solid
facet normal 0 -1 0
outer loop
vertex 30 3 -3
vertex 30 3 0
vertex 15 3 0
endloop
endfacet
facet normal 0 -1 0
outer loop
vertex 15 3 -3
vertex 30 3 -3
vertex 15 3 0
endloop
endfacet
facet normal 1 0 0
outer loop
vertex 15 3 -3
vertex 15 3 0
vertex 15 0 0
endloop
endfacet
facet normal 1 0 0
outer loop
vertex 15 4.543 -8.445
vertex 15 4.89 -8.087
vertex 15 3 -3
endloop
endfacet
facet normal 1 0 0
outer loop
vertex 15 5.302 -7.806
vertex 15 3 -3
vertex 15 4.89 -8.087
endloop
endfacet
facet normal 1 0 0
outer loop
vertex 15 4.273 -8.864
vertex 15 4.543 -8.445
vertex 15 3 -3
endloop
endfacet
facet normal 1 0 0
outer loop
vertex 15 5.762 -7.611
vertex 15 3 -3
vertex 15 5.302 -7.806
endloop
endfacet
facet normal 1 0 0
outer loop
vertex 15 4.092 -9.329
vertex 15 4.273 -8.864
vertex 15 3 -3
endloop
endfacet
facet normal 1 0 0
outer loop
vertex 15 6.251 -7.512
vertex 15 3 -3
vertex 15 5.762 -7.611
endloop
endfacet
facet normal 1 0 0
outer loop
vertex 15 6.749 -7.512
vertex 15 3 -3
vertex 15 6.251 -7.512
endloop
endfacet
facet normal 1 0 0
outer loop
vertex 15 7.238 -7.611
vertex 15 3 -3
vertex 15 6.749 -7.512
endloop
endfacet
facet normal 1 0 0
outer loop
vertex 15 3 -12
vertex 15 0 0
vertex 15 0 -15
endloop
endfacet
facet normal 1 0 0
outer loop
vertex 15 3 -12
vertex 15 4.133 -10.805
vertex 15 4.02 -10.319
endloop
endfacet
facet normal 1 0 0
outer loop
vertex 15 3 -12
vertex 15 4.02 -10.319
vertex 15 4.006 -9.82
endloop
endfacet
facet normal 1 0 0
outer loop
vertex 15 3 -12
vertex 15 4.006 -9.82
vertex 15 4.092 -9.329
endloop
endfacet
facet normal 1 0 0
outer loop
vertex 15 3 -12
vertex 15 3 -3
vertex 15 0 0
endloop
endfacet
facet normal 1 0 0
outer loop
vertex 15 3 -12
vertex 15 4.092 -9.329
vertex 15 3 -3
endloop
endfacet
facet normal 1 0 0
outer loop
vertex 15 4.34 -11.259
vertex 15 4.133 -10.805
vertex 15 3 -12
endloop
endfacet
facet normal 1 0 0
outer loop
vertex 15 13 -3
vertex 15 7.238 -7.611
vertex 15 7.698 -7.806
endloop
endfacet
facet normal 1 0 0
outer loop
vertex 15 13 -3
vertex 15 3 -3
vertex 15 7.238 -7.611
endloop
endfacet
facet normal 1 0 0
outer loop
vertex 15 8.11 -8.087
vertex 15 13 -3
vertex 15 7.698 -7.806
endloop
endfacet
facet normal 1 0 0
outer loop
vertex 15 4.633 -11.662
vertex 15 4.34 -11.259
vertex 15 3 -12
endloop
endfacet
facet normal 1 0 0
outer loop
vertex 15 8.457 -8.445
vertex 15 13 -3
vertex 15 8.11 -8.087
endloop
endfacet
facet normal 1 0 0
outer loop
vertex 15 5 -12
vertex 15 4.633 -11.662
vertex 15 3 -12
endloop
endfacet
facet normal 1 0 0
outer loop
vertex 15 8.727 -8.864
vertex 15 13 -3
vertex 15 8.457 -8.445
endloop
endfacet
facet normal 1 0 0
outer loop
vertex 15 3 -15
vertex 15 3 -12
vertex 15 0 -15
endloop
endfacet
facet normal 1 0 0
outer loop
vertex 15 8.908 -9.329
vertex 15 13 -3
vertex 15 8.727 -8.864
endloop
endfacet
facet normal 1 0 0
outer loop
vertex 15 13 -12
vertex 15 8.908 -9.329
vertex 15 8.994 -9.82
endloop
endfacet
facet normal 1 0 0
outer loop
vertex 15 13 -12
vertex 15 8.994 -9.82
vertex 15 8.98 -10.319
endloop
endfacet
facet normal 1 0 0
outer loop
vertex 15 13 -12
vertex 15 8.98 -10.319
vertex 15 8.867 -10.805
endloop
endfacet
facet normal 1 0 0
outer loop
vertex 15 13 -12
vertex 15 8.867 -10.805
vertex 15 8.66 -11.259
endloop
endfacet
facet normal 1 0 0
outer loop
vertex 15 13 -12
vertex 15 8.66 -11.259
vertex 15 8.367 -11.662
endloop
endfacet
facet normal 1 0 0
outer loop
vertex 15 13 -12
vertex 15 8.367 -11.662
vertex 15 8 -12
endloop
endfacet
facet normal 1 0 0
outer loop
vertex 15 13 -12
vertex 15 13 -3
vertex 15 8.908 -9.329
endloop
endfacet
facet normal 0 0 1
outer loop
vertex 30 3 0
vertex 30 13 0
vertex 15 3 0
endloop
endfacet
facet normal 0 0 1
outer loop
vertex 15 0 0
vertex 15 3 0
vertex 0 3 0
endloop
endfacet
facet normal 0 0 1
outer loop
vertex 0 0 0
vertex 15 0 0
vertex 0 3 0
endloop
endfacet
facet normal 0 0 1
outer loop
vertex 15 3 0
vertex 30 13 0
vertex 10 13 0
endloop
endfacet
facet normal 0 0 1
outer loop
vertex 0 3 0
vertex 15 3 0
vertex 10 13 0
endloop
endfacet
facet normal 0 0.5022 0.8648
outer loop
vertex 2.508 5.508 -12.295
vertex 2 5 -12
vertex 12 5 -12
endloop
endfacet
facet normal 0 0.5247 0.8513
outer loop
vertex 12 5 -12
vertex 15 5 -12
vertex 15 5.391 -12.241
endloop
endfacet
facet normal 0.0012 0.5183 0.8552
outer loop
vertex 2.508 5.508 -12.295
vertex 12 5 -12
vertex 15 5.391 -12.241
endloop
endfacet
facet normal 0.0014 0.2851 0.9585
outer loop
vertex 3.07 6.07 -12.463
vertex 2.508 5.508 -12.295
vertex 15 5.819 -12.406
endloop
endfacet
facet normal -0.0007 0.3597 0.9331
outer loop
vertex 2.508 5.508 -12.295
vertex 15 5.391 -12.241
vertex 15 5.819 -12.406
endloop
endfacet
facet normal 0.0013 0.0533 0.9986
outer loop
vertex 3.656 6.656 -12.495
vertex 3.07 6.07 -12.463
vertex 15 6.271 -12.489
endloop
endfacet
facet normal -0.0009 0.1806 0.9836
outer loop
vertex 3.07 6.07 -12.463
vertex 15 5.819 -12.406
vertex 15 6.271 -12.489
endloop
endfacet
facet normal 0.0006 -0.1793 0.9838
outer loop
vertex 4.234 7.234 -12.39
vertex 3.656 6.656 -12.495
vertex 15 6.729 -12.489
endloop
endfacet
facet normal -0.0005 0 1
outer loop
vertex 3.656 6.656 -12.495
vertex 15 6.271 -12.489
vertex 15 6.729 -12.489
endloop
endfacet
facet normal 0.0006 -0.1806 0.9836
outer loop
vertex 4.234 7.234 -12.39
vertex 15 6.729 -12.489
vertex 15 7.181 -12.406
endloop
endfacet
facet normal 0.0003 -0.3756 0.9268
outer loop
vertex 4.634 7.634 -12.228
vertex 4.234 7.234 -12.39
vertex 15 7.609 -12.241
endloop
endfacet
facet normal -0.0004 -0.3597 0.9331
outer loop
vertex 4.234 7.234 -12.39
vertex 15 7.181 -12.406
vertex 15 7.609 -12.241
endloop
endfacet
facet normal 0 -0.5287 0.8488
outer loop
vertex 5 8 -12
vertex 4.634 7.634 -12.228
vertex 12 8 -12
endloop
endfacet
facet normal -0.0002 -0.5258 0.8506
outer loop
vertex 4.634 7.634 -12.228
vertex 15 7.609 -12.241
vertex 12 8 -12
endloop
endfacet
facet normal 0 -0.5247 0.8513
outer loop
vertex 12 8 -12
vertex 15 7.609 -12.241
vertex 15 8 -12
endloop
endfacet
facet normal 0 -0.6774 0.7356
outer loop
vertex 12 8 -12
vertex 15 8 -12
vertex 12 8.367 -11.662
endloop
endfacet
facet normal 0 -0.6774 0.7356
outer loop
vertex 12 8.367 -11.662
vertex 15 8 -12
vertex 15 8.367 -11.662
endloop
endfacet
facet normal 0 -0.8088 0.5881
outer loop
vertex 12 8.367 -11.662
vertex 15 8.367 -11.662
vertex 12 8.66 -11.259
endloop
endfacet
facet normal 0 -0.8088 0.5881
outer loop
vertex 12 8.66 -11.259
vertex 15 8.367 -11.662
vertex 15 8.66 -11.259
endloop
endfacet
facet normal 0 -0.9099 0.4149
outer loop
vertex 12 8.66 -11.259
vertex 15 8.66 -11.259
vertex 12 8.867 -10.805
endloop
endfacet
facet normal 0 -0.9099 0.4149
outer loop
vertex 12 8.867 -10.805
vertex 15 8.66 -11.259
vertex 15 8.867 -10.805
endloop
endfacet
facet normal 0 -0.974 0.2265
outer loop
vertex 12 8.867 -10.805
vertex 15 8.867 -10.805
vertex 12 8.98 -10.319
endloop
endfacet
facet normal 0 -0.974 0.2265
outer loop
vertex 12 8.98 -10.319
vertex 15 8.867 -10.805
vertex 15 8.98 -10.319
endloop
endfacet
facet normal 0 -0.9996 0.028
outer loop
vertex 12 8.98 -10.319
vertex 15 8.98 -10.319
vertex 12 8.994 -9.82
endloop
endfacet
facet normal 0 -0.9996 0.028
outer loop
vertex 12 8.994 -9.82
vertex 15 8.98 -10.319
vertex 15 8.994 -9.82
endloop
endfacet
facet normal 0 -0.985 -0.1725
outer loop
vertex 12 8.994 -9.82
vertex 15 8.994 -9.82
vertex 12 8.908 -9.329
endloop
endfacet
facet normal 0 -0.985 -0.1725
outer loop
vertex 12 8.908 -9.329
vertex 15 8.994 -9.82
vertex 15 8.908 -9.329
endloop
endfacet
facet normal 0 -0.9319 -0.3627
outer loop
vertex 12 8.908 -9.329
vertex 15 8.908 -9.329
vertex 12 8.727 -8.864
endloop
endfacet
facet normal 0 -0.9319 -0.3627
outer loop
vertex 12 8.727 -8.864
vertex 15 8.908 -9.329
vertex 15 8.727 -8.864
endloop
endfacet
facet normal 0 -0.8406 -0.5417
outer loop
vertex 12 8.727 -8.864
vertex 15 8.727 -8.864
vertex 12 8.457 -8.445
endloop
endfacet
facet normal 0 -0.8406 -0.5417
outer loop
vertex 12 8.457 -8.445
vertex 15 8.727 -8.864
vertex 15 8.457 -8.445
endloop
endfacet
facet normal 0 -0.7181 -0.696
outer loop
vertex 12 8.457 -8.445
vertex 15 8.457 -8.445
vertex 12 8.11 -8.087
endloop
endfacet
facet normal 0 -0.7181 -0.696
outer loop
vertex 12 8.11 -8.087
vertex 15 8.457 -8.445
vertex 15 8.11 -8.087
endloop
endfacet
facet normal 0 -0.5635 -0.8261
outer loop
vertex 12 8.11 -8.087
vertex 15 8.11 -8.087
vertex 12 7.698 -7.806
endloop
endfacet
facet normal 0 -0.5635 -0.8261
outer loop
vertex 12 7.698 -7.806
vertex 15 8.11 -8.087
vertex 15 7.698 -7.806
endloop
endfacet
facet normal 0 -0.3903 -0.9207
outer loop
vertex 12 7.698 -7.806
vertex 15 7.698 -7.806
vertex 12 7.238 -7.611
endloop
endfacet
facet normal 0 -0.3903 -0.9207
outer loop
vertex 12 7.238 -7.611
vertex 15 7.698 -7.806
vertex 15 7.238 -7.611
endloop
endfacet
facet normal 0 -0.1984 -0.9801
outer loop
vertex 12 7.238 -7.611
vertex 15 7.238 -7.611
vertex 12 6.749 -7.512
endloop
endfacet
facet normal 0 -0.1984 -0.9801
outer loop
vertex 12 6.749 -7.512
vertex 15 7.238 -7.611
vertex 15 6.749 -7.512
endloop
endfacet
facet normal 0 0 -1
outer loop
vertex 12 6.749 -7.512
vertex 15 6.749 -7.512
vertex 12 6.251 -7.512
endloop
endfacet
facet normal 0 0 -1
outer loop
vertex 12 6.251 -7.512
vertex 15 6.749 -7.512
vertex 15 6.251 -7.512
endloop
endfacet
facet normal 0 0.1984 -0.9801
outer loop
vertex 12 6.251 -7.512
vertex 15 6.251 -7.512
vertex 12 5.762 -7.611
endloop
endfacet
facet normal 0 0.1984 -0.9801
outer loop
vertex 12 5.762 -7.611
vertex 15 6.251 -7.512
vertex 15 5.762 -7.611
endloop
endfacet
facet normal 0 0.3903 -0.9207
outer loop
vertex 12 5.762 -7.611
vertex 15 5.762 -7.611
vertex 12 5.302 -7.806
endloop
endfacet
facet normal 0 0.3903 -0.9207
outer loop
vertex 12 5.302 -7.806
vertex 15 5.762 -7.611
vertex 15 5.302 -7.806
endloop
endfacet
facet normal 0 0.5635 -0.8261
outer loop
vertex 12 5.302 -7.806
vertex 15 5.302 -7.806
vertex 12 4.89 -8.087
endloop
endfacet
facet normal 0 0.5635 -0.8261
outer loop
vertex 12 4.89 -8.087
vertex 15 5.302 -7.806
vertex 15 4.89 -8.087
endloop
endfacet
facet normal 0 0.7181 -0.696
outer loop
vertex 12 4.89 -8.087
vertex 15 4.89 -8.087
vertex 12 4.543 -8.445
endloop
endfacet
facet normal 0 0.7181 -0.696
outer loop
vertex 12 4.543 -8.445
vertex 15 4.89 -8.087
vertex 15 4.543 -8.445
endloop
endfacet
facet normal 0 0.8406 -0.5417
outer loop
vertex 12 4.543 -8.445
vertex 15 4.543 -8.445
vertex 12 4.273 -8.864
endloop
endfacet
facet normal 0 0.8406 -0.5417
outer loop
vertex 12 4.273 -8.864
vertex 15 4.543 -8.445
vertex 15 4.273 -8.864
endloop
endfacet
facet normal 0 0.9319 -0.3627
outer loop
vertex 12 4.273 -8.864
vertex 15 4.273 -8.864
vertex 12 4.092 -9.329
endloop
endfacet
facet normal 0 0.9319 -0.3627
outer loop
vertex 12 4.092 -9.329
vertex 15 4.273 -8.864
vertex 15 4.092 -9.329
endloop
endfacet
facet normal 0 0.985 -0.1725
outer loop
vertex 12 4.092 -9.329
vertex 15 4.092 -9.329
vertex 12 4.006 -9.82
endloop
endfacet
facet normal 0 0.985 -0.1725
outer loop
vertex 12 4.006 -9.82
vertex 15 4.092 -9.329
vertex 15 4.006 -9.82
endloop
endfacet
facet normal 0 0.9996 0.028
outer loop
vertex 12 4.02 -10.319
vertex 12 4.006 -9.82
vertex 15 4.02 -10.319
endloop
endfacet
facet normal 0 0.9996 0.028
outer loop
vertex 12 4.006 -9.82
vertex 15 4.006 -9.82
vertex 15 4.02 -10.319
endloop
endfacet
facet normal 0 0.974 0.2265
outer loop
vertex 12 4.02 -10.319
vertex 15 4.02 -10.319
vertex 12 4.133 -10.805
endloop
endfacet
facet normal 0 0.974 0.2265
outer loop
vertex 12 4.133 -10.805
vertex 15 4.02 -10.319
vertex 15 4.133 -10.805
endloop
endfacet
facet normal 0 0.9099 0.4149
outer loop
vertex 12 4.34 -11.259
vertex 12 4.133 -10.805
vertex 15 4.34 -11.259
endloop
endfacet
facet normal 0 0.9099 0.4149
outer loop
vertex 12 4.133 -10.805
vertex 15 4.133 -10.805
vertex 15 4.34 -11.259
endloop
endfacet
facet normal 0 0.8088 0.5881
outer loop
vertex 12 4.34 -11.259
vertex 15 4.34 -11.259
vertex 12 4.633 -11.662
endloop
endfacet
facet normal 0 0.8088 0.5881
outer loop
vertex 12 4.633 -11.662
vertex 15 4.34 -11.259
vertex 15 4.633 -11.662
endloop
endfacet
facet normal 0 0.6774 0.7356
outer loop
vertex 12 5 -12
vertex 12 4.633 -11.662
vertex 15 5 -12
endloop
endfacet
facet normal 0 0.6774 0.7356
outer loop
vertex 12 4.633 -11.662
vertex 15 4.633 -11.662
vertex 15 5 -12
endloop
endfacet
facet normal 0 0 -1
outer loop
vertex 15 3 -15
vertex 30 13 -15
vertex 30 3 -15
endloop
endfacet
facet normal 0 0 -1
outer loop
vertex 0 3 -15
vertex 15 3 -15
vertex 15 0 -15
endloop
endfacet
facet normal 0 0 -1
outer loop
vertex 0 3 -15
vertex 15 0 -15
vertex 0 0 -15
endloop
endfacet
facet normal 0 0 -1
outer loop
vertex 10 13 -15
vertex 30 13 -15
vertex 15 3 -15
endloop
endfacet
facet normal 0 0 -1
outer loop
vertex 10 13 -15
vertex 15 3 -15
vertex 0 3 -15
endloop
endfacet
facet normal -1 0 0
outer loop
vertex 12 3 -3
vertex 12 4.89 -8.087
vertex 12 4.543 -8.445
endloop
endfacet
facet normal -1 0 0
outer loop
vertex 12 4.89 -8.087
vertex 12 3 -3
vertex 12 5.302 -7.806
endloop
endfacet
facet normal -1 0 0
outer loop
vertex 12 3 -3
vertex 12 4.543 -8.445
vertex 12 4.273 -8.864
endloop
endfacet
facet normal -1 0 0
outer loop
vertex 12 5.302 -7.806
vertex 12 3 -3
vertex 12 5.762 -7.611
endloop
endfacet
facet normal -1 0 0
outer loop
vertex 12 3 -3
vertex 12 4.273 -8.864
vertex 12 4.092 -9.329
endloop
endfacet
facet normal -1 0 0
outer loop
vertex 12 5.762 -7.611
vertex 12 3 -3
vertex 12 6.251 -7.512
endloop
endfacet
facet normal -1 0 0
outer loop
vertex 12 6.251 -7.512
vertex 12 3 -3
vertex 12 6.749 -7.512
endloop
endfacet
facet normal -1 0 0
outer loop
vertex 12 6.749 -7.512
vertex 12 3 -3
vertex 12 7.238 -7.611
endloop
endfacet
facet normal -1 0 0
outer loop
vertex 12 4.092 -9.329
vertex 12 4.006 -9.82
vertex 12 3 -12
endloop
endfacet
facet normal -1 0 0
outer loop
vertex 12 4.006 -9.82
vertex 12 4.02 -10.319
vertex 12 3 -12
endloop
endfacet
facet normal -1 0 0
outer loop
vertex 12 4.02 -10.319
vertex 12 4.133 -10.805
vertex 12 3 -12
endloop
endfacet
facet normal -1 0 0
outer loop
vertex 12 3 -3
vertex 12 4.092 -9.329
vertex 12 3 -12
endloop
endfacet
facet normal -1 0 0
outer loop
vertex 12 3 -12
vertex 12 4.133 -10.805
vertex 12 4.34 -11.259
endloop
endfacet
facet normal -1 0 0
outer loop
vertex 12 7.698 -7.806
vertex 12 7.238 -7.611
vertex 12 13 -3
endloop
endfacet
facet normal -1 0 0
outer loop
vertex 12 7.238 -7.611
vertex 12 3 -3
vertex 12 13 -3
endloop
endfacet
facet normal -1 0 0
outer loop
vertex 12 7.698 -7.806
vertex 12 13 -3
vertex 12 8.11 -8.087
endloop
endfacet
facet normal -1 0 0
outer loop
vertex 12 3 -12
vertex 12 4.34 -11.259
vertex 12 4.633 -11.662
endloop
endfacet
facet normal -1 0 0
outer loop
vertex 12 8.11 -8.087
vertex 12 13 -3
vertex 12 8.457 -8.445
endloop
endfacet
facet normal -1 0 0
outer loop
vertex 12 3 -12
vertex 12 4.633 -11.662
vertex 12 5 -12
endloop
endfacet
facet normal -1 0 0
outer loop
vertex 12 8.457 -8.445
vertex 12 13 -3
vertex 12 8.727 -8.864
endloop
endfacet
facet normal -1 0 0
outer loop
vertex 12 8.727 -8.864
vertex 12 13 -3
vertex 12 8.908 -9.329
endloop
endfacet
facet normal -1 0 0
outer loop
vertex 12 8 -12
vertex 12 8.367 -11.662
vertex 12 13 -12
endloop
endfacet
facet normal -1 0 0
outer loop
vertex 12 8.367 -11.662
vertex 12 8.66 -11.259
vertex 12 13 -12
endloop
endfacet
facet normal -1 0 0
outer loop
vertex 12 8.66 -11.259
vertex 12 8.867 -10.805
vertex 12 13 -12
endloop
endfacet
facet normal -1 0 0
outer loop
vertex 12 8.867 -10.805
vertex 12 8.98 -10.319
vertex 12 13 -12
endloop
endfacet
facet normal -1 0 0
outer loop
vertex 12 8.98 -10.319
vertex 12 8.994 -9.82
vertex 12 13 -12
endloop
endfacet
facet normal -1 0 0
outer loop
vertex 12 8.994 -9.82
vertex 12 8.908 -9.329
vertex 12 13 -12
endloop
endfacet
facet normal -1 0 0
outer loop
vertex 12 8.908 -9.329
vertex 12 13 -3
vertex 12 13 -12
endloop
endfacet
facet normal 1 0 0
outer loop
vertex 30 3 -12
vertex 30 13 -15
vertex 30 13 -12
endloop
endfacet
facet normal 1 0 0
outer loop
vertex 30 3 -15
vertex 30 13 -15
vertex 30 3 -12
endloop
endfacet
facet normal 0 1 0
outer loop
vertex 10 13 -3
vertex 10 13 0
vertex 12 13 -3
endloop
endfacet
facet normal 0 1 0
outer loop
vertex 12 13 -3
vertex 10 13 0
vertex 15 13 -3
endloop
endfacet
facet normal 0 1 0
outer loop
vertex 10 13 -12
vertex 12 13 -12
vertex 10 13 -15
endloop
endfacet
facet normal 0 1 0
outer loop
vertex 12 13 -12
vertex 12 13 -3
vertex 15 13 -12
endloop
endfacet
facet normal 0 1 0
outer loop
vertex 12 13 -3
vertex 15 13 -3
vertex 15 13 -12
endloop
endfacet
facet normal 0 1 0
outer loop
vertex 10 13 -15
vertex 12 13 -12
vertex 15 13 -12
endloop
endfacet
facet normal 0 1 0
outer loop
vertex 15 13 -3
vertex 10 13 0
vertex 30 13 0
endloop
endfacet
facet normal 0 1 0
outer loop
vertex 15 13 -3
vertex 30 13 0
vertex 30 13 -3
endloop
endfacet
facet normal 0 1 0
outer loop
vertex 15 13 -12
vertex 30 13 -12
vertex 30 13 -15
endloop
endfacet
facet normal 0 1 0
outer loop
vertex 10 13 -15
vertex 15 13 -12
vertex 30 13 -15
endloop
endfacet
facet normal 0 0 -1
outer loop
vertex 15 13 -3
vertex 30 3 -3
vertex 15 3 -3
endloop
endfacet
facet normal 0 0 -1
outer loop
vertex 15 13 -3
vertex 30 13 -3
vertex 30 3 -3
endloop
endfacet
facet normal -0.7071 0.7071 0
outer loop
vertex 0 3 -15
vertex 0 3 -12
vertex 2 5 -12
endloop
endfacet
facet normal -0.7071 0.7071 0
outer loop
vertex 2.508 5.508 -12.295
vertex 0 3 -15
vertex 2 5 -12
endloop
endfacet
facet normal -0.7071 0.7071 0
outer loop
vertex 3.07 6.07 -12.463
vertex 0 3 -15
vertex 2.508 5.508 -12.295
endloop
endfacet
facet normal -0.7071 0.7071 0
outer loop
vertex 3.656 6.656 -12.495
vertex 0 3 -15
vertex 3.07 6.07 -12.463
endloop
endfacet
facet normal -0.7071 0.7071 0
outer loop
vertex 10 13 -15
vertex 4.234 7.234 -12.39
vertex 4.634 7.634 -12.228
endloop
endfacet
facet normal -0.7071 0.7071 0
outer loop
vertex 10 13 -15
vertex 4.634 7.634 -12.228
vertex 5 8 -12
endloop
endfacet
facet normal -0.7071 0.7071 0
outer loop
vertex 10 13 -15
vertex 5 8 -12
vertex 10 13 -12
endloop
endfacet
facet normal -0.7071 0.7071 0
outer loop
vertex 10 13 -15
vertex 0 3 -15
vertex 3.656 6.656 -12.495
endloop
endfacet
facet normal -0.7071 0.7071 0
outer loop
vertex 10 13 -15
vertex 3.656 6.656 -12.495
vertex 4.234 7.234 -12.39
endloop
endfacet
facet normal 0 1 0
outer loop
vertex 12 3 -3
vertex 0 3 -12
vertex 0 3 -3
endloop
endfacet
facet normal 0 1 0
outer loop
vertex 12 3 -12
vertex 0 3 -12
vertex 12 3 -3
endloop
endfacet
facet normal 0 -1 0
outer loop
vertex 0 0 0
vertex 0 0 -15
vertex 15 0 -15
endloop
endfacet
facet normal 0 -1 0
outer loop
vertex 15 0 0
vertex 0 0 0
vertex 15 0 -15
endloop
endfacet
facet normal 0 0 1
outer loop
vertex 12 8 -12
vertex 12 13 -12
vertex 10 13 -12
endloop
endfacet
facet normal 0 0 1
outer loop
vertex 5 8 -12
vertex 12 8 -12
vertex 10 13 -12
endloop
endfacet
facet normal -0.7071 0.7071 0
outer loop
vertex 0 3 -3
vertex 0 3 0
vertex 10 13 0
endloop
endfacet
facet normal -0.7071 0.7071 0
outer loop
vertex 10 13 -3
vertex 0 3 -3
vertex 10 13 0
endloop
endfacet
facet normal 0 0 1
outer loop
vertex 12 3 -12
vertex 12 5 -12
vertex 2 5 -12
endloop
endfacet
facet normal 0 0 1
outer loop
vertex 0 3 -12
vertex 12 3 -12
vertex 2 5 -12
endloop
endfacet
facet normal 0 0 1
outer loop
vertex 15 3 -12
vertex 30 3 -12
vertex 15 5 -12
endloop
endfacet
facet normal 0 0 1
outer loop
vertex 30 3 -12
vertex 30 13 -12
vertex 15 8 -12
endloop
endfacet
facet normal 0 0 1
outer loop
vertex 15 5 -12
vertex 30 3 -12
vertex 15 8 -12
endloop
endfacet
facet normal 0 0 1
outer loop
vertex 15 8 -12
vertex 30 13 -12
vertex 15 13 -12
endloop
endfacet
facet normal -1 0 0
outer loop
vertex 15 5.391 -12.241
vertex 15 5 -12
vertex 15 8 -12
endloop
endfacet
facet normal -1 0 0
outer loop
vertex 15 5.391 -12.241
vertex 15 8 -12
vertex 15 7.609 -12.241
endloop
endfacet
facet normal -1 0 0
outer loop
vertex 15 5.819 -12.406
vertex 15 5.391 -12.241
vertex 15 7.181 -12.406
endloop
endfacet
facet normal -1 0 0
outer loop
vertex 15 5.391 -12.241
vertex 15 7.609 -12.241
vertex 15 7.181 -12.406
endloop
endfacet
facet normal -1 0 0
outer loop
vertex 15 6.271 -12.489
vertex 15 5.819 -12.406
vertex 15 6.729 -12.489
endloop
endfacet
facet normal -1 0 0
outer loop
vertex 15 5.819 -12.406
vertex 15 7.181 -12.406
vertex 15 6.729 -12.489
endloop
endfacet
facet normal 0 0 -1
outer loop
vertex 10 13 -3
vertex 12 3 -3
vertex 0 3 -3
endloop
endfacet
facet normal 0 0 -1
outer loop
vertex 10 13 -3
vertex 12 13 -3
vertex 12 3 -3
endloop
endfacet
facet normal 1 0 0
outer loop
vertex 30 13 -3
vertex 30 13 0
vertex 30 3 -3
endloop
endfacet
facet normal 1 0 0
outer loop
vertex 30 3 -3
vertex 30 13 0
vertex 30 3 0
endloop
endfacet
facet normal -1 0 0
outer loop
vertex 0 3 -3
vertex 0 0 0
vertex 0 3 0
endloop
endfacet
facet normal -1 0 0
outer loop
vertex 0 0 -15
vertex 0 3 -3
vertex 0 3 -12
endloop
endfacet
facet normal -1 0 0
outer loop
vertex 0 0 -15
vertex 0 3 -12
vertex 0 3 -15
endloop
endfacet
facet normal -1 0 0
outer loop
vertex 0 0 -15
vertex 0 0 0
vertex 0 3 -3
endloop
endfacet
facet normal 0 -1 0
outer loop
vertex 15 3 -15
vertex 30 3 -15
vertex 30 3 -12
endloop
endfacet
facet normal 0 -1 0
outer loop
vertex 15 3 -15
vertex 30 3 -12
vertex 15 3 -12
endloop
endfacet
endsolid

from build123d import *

# Parameters (mm, degrees)
SKETCH2_W           = 15
SKETCH2_H           = 15
BOSS_EXTRUDE1_DEPTH = 3
BOSS_EXTRUDE2_DEPTH = 3
SKETCH5_W           = 9
SKETCH5_H           = 10
BOSS_EXTRUDE4_DEPTH = 3
CUT_EXTRUDE1_REACH  = 26.88
SKETCH6_R           = 2.5


with BuildPart() as part:
    # Sketch2 → Boss-Extrude1 (new body)
    with BuildSketch(Plane(origin=(0, 0, 0), x_dir=(1, 0, 0), z_dir=(0, 1, 0))):
        with Locations((7.5, 7.5)):
            Rectangle(SKETCH2_W, SKETCH2_H)
    extrude(amount=BOSS_EXTRUDE1_DEPTH)

    # Sketch3 → Boss-Extrude2 (add)
    with BuildSketch(Plane.XY):
        Polygon((0, 3), (10, 13), (30, 13), (30, 3), align=None)
    boss_extrude2 = extrude(amount=-BOSS_EXTRUDE2_DEPTH)

    # Mirror1: Boss-Extrude2 across plane
    add(boss_extrude2.mirror(Plane.XY.offset(-7.5)))

    # Sketch5 → Boss-Extrude4 (add)
    with BuildSketch(Plane(origin=(15, 0, 0), x_dir=(0, 0, -1), z_dir=(1, 0, 0))):
        with Locations((7.5, 8)):
            Rectangle(SKETCH5_W, SKETCH5_H)
    extrude(amount=-BOSS_EXTRUDE4_DEPTH)

    # Sketch6 → Cut-Extrude1 (cut, up to next)
    with BuildSketch(Plane(origin=(15, 0, 0), x_dir=(0, 0, -1), z_dir=(1, 0, 0)), mode=Mode.PRIVATE) as cut_extrude1_sk1:
        with Locations(Location((10, 6.5, 0), (0, 0, 323.130102354))):
            Circle(SKETCH6_R)
    cut_extrude1_tool1 = extrude(cut_extrude1_sk1.sketch, amount=-CUT_EXTRUDE1_REACH, mode=Mode.PRIVATE) & part.part
    add(cut_extrude1_tool1.solids().sort_by_distance((15, 6.5, -10))[0], mode=Mode.SUBTRACT)


solid = part.part
